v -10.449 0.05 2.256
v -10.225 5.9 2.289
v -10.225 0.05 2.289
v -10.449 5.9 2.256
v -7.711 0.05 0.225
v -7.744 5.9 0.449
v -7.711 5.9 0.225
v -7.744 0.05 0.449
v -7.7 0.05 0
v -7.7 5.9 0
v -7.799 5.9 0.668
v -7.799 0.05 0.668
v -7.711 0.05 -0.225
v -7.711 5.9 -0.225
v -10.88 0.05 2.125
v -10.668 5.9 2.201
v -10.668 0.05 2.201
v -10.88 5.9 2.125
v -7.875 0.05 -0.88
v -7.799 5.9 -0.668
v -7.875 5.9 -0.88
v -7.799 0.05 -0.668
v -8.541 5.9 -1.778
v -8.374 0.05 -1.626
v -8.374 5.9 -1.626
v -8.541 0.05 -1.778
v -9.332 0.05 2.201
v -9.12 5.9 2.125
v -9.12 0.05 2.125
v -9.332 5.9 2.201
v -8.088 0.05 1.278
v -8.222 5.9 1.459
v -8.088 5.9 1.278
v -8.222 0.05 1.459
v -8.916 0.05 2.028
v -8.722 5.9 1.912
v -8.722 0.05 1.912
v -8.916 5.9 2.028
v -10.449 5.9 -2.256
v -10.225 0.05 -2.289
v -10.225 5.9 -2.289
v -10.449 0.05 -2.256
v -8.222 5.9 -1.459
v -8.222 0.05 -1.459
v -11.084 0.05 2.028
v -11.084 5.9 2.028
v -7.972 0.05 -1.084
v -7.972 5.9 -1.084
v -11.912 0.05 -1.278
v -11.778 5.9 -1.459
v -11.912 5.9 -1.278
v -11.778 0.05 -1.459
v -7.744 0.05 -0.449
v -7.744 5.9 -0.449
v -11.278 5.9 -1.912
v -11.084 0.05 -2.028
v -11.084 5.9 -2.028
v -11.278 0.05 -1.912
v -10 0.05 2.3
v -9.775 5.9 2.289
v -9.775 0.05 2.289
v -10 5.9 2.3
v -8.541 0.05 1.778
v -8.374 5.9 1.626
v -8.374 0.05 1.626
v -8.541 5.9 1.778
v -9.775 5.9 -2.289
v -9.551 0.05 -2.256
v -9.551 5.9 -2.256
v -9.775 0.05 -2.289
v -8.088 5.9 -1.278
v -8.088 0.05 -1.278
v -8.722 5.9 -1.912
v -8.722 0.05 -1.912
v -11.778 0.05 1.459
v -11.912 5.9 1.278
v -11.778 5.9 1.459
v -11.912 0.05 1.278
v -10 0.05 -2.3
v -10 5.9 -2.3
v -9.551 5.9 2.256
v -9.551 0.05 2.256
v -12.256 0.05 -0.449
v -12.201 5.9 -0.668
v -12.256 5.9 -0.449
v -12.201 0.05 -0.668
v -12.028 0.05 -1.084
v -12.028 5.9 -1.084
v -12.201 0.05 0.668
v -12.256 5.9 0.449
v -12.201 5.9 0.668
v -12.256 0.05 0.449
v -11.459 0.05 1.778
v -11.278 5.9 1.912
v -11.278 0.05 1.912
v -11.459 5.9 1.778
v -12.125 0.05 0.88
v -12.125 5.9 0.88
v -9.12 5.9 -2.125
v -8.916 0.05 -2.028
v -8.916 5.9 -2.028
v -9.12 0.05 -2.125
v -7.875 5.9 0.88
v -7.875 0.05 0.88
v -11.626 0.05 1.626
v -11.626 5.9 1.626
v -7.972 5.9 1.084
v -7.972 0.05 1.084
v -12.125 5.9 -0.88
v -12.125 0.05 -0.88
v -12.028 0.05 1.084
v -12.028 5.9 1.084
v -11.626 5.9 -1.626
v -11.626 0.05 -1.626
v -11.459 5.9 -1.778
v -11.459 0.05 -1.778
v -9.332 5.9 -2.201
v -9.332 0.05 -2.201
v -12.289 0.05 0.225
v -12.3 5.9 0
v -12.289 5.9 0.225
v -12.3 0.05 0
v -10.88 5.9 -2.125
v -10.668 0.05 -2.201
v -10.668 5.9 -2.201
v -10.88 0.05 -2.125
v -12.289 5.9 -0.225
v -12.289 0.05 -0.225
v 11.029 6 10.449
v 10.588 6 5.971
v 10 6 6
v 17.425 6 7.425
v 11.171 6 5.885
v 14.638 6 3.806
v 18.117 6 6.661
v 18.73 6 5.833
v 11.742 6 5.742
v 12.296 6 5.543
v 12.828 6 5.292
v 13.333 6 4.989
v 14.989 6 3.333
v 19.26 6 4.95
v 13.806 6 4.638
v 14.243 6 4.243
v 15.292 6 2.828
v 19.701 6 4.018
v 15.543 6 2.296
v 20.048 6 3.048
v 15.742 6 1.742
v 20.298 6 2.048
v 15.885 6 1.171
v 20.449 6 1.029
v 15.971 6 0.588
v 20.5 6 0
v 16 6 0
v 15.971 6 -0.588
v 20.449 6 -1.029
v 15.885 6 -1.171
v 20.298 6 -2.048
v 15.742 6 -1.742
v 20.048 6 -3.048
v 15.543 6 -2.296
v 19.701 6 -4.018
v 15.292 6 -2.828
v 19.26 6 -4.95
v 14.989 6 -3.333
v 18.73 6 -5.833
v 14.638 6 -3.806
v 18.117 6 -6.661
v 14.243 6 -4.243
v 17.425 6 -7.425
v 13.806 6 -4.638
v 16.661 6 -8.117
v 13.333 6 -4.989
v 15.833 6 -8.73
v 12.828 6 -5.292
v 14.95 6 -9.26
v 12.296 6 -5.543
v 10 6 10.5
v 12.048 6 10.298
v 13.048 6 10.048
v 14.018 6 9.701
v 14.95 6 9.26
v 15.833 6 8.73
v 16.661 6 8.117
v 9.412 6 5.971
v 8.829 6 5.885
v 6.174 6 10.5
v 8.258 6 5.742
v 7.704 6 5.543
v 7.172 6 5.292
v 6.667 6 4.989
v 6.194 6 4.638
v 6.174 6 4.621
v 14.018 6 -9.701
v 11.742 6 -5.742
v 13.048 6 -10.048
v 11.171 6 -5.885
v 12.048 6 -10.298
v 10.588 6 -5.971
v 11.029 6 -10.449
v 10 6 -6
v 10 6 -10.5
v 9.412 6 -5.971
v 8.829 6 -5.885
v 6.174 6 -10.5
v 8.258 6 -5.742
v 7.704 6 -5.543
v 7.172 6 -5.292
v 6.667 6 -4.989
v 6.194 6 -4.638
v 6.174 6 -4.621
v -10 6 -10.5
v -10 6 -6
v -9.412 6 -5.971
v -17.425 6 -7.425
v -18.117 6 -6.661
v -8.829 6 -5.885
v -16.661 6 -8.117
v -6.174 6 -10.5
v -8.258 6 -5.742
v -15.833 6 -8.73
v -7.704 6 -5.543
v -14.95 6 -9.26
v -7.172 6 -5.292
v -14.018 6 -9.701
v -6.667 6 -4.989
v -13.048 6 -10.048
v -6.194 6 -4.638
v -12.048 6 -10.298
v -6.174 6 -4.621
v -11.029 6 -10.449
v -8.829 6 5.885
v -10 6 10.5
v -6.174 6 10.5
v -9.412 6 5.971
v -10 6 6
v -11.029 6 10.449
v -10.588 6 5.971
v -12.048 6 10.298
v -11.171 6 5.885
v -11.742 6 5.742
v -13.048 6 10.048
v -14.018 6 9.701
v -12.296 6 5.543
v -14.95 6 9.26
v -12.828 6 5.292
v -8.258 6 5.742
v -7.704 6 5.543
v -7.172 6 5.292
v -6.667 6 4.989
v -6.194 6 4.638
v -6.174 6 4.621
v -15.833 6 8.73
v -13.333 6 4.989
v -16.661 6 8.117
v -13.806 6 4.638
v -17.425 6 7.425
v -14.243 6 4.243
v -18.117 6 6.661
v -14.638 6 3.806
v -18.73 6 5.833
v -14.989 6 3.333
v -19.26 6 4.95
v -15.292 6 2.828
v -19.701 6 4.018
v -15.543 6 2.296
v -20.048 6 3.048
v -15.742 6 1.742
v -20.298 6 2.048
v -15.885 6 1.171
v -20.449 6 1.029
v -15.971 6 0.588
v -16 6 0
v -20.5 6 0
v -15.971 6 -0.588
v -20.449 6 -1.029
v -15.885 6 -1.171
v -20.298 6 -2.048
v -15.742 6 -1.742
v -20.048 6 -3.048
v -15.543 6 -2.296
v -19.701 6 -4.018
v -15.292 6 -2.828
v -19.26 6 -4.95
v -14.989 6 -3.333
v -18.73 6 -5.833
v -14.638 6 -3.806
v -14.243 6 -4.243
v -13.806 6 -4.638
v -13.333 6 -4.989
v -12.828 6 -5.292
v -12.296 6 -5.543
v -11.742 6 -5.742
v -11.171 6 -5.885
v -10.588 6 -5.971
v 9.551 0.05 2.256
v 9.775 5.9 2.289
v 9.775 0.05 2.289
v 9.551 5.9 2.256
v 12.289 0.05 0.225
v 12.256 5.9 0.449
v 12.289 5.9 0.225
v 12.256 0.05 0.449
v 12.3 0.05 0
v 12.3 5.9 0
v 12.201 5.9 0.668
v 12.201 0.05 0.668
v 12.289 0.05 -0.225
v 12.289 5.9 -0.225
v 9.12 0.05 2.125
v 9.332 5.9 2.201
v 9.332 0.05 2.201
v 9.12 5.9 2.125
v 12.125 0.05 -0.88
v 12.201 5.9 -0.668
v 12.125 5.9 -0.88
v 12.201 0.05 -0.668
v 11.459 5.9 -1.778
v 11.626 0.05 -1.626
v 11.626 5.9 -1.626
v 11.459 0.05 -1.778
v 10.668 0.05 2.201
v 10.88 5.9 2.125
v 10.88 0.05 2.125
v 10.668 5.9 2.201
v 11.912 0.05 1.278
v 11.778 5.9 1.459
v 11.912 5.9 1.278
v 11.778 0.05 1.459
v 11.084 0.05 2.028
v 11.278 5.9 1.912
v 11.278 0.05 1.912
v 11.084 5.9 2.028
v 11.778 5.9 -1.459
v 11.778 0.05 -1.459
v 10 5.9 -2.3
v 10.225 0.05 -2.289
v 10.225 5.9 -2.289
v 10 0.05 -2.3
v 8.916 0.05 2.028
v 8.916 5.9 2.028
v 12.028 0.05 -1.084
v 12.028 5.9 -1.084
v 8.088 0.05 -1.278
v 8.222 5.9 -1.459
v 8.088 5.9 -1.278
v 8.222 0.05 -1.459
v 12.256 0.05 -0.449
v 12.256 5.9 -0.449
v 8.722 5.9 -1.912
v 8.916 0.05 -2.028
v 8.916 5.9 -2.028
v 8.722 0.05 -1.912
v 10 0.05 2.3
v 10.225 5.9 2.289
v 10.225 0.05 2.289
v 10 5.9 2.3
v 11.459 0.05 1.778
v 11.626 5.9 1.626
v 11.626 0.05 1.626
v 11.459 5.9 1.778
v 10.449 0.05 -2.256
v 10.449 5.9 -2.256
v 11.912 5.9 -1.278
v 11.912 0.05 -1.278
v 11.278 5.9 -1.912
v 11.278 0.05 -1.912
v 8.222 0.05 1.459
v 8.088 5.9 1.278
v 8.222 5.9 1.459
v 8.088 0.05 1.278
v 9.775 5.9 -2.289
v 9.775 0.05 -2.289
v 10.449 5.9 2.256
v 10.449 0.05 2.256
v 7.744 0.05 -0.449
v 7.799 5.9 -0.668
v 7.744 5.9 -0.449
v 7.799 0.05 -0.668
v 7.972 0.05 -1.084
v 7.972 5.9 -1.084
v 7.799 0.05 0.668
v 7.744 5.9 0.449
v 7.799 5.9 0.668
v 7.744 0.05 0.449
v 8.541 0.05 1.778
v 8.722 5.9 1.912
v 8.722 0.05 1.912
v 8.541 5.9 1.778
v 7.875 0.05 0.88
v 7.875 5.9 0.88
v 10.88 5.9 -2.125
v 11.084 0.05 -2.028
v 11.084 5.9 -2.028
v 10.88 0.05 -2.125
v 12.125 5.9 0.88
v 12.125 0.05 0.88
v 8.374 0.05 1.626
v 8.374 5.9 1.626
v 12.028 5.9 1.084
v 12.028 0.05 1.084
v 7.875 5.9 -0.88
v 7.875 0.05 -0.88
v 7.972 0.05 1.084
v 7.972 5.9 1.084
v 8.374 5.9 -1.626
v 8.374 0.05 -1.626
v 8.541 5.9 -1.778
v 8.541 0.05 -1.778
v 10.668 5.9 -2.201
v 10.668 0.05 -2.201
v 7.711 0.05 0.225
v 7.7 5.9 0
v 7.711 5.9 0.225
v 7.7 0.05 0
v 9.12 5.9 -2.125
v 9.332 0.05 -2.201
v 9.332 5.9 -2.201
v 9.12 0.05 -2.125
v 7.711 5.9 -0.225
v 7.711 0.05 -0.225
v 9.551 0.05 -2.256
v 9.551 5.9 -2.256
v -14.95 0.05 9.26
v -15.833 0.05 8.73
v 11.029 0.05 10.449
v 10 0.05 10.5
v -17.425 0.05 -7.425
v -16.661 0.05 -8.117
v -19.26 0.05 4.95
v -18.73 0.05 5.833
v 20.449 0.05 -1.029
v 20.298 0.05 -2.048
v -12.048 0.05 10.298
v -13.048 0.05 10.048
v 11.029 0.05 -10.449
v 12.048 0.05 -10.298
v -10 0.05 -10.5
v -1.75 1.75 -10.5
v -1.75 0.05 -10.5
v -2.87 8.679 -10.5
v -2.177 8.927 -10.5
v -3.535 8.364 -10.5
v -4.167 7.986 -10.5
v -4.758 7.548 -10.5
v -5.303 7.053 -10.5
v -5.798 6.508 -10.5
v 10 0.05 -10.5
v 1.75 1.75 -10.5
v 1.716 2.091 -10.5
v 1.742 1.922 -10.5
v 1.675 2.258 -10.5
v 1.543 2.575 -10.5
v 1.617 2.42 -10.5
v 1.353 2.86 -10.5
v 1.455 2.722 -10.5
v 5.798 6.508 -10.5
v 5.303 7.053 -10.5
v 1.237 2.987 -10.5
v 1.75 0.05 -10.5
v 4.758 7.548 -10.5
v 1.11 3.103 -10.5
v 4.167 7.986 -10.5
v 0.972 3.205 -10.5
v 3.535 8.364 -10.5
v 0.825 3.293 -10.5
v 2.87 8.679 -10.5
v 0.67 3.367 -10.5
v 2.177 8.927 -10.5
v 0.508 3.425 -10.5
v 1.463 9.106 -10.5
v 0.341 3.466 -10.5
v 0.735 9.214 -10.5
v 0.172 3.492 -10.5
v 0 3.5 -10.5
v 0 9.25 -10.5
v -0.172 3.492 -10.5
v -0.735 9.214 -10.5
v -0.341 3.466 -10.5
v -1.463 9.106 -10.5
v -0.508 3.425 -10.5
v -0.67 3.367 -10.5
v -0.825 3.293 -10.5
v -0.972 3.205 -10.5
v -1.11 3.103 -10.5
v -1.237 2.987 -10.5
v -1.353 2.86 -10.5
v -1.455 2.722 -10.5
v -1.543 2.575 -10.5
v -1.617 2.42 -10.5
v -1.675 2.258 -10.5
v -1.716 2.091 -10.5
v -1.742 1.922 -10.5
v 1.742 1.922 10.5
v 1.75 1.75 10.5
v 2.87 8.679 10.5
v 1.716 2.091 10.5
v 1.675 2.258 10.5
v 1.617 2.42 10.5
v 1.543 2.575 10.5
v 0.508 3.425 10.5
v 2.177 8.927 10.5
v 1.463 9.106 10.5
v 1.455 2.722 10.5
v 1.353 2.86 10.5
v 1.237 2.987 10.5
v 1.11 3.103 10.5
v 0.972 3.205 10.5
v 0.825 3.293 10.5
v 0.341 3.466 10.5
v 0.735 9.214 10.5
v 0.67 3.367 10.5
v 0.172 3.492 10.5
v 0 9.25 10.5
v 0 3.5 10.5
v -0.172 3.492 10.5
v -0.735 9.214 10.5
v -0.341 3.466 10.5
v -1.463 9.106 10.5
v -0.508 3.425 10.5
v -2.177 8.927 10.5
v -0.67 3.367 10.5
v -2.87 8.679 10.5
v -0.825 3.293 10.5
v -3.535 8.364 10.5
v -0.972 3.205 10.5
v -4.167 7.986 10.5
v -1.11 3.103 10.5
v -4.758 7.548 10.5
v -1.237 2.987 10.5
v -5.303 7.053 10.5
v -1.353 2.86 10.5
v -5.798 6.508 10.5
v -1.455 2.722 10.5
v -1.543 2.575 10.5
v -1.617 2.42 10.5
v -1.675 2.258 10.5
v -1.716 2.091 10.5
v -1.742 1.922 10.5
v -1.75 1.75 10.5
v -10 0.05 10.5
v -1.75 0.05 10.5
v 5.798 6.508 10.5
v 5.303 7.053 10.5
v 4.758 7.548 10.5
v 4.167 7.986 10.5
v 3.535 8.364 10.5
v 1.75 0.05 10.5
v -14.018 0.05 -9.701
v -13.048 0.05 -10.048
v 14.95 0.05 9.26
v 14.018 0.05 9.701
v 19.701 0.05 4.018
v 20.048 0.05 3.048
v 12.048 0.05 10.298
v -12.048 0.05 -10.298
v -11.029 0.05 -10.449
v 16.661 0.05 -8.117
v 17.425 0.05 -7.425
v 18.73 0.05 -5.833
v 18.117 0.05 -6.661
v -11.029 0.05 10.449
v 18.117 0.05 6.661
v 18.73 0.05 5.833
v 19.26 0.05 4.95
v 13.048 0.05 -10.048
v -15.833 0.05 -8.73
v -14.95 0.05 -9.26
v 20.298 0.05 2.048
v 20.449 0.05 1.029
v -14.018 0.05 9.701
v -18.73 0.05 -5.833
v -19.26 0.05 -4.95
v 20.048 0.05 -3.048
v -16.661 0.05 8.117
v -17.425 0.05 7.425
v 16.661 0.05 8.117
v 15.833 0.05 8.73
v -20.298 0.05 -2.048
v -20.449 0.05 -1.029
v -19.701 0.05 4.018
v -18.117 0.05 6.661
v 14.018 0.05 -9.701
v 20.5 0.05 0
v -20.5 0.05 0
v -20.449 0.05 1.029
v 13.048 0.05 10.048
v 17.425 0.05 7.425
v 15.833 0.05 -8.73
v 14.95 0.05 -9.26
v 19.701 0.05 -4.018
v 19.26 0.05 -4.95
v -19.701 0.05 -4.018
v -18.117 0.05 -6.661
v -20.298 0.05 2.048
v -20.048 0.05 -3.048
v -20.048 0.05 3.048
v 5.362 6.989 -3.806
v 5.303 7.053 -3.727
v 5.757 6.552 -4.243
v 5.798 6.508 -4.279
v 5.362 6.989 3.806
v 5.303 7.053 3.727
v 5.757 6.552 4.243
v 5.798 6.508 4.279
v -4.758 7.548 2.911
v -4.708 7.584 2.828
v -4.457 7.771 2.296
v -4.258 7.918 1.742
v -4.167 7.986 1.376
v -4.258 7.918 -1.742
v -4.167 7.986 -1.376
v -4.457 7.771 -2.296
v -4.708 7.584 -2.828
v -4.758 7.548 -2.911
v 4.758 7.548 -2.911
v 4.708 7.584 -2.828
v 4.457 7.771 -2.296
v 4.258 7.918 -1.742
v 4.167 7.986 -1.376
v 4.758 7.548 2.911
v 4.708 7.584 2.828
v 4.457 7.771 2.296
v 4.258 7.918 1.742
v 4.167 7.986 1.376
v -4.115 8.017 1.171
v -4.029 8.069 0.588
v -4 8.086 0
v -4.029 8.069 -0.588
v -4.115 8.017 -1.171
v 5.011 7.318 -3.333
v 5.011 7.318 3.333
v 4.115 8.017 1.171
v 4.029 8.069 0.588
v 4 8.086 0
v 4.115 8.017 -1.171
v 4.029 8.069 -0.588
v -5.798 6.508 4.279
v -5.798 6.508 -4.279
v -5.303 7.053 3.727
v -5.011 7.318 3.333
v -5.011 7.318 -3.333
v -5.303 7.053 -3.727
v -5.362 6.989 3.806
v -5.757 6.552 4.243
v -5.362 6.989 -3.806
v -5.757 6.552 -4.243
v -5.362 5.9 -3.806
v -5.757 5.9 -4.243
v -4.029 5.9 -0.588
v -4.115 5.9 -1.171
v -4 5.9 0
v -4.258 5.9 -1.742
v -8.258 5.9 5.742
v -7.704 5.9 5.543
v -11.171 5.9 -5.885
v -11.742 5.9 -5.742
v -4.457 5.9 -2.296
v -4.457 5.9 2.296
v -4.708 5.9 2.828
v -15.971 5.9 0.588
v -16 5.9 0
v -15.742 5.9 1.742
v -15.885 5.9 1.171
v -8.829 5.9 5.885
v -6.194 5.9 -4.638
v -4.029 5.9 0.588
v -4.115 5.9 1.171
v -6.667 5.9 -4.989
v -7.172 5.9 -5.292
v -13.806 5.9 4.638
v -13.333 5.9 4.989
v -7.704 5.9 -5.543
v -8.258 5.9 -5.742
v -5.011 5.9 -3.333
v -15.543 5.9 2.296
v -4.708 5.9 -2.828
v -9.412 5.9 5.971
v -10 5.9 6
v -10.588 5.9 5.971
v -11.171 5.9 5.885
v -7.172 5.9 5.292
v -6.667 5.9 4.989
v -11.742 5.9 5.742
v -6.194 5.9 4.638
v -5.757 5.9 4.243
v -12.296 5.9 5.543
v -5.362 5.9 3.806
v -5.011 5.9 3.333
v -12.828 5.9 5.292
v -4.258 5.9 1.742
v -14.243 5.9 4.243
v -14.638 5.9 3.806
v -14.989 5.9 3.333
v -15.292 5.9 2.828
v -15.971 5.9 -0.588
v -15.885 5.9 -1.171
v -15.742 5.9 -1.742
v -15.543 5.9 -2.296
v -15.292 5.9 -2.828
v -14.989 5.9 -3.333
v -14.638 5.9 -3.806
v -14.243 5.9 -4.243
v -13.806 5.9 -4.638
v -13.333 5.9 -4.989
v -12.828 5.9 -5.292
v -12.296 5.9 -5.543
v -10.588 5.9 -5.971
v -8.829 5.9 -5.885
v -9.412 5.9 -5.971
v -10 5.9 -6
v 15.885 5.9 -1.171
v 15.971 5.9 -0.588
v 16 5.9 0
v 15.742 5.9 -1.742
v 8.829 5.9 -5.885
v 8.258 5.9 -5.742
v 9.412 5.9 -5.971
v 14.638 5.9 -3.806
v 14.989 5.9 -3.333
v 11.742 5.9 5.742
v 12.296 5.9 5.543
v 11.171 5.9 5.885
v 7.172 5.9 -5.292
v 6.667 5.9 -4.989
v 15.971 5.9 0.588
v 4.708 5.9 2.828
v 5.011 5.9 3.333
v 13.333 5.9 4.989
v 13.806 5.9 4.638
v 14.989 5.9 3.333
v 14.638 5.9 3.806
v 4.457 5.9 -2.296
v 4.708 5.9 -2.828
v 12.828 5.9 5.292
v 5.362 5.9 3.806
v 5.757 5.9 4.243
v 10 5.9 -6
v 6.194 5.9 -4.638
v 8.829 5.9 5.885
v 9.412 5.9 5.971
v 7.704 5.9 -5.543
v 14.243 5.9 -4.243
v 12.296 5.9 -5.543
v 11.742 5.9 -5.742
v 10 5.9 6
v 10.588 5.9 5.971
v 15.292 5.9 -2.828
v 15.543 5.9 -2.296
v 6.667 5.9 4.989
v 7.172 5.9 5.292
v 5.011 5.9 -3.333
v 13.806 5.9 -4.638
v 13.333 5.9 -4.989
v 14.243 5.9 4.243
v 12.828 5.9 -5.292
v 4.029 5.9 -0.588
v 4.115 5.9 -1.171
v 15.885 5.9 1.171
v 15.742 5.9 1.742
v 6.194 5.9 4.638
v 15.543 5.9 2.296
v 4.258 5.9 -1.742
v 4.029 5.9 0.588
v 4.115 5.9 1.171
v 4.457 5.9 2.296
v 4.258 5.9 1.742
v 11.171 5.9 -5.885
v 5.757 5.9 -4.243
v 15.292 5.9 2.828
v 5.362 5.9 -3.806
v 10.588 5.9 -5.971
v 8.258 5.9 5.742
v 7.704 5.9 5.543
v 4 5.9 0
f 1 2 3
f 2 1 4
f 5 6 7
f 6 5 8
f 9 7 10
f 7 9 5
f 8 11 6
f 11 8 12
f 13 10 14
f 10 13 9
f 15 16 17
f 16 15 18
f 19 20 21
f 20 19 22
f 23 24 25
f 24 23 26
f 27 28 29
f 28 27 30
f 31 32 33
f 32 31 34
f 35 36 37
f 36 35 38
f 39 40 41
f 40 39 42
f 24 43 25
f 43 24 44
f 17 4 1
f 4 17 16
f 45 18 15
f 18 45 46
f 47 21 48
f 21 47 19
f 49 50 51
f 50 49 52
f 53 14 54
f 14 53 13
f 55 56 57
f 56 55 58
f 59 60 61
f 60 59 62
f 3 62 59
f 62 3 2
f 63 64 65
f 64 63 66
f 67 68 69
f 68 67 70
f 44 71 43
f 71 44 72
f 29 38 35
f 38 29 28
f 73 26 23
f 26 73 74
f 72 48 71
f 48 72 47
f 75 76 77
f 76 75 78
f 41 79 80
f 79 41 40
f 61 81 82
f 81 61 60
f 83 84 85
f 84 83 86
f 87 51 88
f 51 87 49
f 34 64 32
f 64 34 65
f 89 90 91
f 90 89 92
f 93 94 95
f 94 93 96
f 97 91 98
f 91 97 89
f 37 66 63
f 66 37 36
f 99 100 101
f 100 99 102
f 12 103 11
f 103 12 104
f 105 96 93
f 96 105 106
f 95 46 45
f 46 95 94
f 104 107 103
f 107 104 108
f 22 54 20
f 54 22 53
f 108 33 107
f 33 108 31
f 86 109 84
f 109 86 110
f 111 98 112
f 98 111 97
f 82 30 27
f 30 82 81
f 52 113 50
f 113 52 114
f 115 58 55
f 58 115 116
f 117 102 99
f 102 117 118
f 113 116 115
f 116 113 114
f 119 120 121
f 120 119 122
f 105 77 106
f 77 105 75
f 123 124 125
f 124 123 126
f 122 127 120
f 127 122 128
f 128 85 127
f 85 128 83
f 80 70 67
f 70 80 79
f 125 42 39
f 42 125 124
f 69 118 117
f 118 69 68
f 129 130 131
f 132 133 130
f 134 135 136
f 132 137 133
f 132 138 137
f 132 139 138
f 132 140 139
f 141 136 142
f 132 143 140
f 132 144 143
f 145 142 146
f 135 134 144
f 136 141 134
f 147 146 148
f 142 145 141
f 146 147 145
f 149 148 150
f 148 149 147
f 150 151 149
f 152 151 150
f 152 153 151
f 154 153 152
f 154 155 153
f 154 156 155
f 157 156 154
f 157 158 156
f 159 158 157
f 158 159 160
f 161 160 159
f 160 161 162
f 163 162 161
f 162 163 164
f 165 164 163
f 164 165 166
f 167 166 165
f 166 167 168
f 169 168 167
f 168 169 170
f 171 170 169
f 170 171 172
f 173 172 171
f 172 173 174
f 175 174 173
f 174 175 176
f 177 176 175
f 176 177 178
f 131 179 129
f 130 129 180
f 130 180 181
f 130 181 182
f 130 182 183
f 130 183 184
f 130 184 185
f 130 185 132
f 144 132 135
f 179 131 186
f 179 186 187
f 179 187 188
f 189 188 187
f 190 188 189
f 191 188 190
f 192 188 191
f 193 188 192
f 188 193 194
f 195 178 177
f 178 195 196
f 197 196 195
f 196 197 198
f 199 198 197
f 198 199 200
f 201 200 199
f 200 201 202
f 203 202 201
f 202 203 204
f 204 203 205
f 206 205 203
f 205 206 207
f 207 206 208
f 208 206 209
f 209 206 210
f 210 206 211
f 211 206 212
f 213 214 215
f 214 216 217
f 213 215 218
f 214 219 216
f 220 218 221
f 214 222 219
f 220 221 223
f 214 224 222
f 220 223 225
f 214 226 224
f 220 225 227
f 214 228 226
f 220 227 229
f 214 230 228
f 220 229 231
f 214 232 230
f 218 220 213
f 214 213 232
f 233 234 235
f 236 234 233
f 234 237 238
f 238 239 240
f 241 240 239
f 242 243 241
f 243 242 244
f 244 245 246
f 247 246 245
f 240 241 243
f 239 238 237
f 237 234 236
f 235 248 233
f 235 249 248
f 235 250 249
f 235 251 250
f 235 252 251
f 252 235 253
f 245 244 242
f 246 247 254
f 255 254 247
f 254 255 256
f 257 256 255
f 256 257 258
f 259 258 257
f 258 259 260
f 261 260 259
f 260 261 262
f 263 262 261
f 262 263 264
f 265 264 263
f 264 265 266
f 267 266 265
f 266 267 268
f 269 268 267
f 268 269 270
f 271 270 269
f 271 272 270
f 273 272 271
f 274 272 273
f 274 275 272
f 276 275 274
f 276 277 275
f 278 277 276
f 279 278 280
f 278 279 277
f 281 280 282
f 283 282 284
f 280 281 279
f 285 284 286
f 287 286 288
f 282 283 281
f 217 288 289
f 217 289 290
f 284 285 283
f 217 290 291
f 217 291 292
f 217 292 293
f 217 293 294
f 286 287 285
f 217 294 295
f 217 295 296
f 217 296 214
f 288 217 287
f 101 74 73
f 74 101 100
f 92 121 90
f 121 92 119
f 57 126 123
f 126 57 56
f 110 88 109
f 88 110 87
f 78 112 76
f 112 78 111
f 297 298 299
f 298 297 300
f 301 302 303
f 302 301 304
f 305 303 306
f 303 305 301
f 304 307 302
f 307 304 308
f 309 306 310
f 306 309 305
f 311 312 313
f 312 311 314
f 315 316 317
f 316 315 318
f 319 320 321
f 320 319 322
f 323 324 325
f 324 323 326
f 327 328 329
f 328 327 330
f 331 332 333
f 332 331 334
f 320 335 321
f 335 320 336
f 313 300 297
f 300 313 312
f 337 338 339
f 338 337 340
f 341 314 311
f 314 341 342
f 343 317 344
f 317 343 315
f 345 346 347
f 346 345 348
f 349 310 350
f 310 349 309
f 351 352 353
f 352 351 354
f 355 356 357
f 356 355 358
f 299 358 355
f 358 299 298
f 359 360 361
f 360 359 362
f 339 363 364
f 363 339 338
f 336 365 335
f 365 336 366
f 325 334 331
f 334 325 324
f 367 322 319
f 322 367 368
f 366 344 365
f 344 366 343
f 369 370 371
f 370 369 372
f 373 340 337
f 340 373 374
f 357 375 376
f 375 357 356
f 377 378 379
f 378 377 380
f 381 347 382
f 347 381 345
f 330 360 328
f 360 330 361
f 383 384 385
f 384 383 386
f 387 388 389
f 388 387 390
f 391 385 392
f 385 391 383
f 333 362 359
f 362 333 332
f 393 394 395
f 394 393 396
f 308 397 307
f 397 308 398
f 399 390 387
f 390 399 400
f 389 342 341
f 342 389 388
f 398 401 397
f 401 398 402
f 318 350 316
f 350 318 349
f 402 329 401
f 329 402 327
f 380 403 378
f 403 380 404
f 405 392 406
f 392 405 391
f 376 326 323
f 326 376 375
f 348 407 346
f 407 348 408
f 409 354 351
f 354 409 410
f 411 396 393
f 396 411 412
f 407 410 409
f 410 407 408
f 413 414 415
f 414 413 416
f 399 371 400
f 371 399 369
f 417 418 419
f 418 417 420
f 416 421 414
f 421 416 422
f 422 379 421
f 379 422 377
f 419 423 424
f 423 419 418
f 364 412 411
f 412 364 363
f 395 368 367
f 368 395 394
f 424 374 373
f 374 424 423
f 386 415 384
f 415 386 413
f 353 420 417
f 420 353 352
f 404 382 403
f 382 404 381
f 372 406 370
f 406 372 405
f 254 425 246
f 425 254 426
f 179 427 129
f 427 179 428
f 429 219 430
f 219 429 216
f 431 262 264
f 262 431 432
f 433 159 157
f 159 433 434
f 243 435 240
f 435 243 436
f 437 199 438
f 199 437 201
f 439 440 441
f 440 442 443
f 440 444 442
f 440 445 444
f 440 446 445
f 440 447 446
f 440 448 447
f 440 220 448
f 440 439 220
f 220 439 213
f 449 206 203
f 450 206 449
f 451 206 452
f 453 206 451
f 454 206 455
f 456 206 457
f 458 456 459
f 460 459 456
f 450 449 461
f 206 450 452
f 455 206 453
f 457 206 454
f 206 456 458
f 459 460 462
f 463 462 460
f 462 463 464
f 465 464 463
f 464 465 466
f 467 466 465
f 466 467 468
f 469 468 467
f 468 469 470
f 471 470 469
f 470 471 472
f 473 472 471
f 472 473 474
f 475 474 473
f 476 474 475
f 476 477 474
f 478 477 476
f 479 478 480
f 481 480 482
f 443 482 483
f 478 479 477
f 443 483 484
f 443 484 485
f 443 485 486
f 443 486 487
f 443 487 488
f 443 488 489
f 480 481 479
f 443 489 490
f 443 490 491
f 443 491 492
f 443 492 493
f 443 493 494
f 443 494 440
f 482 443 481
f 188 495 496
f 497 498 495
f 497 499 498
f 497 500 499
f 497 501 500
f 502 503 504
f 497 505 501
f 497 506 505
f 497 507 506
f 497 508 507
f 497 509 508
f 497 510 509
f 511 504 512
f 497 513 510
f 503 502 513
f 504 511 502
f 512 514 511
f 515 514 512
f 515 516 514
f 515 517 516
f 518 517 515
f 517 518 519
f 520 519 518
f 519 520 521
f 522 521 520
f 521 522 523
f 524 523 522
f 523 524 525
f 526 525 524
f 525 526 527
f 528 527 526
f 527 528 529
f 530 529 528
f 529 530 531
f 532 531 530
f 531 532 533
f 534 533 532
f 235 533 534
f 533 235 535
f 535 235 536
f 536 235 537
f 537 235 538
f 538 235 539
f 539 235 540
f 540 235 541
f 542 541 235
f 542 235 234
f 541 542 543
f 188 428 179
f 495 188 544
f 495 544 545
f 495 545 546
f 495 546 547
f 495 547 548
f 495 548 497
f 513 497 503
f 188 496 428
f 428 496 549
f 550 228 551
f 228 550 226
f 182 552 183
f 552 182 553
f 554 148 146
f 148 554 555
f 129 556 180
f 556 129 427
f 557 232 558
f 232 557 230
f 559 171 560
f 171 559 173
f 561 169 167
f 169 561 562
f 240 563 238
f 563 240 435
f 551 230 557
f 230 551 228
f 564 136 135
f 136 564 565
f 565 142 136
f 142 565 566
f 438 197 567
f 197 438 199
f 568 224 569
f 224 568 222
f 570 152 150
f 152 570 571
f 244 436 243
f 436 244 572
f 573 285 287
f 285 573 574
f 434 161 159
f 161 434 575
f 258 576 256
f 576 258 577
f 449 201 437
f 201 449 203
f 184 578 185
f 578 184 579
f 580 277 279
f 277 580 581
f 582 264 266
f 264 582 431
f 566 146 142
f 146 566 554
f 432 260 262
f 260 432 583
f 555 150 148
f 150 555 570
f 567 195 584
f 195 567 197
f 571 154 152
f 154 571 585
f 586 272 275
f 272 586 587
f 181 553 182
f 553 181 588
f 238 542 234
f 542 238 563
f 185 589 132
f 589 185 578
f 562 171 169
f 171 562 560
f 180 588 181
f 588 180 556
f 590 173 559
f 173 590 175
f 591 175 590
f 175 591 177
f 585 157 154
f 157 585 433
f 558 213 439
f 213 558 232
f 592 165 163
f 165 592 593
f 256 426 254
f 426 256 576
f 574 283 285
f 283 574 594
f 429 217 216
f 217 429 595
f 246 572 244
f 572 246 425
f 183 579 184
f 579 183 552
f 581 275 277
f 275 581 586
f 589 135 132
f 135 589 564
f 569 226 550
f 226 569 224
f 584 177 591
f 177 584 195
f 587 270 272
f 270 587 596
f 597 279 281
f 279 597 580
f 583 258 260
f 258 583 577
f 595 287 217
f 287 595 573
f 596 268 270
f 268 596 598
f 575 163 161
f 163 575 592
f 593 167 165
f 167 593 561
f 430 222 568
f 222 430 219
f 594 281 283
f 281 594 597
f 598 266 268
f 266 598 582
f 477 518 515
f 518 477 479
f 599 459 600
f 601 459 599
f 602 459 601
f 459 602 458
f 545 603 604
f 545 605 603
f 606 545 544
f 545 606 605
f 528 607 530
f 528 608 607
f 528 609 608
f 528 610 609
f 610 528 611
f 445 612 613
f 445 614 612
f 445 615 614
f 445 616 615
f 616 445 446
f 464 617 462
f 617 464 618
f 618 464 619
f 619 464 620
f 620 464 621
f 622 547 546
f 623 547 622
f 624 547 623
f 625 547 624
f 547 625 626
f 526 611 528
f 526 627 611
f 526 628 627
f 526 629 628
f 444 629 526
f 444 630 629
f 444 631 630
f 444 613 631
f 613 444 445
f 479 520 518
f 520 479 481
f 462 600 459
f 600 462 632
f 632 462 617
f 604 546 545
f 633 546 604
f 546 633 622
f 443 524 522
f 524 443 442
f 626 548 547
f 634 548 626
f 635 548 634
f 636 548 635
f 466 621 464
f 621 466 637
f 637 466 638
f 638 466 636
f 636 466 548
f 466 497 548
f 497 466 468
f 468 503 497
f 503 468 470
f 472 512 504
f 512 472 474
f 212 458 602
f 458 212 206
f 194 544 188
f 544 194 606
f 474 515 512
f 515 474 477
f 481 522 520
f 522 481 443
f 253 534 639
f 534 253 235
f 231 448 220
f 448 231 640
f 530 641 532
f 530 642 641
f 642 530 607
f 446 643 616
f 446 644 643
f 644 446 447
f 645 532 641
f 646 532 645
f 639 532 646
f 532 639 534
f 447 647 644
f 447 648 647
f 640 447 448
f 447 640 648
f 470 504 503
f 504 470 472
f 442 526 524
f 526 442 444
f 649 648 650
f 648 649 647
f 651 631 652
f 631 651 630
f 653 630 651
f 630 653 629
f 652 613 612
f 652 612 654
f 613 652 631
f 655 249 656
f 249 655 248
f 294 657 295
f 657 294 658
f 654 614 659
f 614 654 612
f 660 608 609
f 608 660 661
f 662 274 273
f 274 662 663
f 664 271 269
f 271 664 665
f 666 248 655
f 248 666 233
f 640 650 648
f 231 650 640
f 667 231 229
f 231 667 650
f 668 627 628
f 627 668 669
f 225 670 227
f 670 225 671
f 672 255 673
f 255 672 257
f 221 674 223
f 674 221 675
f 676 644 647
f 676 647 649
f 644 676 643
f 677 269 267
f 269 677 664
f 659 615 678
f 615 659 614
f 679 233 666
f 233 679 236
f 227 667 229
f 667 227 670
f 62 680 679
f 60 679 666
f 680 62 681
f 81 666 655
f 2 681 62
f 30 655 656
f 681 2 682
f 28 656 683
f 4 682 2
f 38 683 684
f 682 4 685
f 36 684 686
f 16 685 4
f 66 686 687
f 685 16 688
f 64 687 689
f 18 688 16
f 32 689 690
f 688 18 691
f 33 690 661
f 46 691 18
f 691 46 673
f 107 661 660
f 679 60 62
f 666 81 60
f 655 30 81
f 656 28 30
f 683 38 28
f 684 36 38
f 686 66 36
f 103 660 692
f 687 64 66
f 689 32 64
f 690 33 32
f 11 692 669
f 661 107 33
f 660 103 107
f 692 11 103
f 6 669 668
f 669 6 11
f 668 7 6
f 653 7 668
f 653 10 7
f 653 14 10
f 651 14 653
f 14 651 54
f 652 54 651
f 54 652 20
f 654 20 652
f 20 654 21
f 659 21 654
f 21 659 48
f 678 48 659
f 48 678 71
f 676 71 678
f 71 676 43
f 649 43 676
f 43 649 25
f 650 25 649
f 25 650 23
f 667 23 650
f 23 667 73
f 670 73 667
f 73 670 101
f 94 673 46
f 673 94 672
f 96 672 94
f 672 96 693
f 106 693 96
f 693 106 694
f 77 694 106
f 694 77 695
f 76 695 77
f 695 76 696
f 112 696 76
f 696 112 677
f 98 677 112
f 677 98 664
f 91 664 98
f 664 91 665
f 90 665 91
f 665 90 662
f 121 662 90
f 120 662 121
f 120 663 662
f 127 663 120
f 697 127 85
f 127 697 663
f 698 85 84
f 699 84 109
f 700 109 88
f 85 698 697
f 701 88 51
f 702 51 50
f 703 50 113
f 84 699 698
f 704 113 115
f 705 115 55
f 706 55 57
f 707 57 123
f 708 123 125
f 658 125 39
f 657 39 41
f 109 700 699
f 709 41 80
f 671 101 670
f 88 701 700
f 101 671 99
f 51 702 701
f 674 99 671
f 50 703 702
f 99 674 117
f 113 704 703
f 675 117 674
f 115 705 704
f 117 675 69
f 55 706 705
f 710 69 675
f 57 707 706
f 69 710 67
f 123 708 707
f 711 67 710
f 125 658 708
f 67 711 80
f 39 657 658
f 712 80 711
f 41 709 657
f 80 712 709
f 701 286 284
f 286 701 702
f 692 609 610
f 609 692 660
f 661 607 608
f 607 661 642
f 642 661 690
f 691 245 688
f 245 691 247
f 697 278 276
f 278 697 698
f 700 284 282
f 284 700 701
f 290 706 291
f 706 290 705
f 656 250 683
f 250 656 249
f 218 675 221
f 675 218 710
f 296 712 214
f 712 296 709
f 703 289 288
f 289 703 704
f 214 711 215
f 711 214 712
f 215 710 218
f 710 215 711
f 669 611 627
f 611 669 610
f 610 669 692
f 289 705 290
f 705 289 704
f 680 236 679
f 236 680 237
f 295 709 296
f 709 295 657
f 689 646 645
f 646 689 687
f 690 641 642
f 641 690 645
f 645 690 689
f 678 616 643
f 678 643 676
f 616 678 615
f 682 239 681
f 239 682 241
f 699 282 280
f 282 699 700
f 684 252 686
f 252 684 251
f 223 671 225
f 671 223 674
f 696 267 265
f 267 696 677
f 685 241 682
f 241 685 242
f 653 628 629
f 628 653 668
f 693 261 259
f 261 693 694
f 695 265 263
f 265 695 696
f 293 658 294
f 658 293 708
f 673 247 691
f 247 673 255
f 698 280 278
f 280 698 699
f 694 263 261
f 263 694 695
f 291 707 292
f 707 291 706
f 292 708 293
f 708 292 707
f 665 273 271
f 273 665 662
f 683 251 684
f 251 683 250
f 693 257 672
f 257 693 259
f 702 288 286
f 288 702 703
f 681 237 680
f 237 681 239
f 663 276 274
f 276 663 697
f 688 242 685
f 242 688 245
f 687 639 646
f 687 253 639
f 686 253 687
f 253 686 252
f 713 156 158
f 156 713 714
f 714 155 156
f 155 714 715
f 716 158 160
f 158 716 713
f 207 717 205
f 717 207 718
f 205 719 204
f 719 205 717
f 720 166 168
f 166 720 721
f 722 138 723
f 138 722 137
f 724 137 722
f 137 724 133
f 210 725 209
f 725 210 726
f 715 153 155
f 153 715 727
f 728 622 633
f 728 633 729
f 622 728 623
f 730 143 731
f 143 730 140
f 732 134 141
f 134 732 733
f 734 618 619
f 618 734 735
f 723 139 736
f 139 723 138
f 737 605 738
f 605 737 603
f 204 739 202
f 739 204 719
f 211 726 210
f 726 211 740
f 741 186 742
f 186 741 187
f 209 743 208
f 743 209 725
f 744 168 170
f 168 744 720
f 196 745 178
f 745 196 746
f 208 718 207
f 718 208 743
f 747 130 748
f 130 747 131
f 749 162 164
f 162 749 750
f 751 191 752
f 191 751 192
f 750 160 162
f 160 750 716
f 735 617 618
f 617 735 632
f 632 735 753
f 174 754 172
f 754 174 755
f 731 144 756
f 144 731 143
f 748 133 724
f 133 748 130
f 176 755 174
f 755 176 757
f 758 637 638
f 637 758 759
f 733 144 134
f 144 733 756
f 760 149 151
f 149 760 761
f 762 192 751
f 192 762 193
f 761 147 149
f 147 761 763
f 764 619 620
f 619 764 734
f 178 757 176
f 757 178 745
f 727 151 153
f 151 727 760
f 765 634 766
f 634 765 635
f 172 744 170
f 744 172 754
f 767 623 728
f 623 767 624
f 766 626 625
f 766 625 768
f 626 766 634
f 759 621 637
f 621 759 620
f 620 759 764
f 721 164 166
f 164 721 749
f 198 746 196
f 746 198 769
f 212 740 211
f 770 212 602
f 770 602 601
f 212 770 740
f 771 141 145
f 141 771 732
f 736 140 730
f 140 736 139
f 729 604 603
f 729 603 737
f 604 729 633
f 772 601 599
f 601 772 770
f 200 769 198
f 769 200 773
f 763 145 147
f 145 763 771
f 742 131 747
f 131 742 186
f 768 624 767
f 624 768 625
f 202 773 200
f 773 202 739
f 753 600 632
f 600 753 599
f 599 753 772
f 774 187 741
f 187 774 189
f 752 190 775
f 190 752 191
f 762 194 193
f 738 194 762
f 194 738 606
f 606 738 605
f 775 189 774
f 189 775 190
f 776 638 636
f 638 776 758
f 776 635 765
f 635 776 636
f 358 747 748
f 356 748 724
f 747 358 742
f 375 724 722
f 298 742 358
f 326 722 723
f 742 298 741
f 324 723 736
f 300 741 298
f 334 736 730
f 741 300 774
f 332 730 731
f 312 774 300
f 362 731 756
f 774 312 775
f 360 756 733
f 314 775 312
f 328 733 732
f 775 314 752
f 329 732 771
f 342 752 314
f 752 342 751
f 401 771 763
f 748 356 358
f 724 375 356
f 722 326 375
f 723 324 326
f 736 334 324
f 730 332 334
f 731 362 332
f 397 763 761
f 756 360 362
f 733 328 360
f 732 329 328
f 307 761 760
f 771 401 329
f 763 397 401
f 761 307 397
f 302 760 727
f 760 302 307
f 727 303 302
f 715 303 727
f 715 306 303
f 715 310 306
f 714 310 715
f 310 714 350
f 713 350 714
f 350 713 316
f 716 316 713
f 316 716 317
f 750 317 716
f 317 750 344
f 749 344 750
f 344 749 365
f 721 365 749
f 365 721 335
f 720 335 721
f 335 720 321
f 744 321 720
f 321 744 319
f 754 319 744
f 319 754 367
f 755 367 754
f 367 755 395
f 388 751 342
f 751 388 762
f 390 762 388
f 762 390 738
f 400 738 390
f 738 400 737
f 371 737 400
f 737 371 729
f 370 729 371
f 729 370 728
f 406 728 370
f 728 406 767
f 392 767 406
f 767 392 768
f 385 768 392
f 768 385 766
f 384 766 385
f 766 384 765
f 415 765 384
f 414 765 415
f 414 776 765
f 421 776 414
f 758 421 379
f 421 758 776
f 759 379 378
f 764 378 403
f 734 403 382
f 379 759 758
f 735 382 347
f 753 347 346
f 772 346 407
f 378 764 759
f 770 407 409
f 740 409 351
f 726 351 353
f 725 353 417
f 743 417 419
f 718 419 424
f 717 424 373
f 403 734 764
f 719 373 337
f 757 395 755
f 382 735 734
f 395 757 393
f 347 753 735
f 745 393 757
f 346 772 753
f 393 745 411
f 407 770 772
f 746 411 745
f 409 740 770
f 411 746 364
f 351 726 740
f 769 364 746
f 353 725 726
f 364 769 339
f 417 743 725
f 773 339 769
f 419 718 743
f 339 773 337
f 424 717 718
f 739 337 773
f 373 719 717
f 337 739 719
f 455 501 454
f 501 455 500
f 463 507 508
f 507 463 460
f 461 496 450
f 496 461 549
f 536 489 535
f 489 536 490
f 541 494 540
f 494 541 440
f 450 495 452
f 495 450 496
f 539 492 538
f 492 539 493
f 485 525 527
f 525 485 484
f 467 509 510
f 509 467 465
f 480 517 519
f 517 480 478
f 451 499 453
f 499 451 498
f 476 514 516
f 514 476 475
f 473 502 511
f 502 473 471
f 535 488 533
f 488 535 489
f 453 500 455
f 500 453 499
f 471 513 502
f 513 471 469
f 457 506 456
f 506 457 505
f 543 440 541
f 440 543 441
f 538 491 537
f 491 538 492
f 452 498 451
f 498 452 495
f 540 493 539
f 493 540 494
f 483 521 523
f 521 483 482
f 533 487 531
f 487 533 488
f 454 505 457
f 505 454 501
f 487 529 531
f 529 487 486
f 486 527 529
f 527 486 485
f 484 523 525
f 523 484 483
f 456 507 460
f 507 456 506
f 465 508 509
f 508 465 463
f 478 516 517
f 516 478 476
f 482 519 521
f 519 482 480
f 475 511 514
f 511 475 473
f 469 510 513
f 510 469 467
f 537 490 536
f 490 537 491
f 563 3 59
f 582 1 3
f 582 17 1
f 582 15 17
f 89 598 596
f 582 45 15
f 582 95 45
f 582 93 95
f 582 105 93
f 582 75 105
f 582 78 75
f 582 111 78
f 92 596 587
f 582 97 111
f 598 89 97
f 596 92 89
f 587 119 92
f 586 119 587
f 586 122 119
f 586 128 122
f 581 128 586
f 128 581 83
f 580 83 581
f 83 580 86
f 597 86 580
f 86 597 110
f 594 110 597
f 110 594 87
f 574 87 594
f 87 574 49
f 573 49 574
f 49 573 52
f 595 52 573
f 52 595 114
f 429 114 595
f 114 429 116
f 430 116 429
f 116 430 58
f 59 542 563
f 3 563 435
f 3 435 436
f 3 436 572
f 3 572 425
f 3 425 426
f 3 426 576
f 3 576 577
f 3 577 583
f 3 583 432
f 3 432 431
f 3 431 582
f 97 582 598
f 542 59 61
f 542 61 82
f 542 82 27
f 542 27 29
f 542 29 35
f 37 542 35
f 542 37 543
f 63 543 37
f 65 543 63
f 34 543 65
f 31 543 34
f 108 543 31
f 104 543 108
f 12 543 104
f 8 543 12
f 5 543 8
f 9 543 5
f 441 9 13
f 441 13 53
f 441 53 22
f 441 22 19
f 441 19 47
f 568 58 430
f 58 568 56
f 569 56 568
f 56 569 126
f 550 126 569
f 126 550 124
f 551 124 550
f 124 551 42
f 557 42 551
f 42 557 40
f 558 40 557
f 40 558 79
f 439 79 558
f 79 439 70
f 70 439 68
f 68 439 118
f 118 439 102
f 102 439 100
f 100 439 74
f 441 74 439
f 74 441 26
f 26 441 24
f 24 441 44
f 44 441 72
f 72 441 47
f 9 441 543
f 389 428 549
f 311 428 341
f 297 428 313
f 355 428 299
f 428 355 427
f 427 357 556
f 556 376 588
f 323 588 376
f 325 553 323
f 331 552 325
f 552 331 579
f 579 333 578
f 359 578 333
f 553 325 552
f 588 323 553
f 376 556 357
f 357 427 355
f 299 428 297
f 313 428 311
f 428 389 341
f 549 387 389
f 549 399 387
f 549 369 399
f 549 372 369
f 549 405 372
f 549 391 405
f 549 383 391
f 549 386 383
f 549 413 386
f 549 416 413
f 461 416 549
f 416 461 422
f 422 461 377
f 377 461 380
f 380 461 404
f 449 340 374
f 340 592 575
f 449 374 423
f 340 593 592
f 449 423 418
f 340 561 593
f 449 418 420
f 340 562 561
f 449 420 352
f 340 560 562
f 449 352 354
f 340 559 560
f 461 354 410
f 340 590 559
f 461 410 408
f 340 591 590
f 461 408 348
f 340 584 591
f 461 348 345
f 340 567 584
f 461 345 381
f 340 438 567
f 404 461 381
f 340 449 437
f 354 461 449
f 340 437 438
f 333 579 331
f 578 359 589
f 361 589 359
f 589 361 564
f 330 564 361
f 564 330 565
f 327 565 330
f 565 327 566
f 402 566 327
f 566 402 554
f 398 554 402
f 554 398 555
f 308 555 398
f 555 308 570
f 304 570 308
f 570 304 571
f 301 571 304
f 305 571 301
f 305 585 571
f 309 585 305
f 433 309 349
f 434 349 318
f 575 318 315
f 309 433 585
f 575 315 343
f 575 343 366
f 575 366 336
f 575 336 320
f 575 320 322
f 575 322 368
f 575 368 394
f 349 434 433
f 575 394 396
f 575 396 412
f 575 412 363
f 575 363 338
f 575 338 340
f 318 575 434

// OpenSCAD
/*
*   D Ring mounting bracket.
*   CudaTox, http://cudatox.ca/l/
*   @cudatox
*
*   Feb 17, 2017
*
*   A simple, procedural mounting bracket that can be used to affix a D Ring to many
*   different surfaces. 
*
*   This software and 3D model(s) are experimental and are provided for educational 
*   purposes only. 
*
*   Use of this software, any of its derivatives, or use of any of the models or 
*   parts provided with or created using this software is done at your own risk. 
*
*   DO NOT use this part for securing loads. DO NOT use this part in applications 
*   that may result in property damage, injury or death. NOT FOR CLIMBING USE.
*
*/


OD = 15;                        //Diameter of the outer cylindrical part of the bracket.
                                //This should be larger than ID

ID = 3.5;                       //Inner diameter of the bracket

length = 21;                    //width of the bracket, this should be smaller 
                                //than the width of the D ring.
                                
thickness = 6;                  //Thickness of the flat parts of the bracket

drill_centers = 20;             //Distance between the mounting holes

drill_dia = 4.6;                //Diameter of the mounting holes

head_dia = 12;                  //Cutaway for the head of the screw or washer. Zero to disable.

head_inset = 0.1;               //Inset distance for the head of the screw, 
                                //if head cutaway enabled.

$fn = 64;                       //Resolution

difference(){
    
    union(){
        hull(){
            translate([0,ID/2,0])
                cylinder(length, OD/2, OD/2,  true);
            translate([0,-ID/2,0])
                cylinder(length, OD/2, OD/2,  true);
        }
        rotate([90,0,0])
            difference(){

                hull(){
                    translate([-drill_centers/2,0,0])
                        cylinder(thickness * 2, length/2, length/2, true);
                    translate([drill_centers/2,0,0])
                        cylinder(thickness * 2, length/2, length/2, true);
                }
                
                union(){
                    translate([-drill_centers/2,0,0])
                        cylinder(thickness * 2, drill_dia/2, drill_dia/2, true);
                    translate([drill_centers/2,0,0])
                        cylinder(thickness * 2, drill_dia/2, drill_dia/2, true);
                }
            }
    }
    
    union(){
        //Cuts with a small factor added to avoid manifold issues.
        hull(){
        translate([0,ID/2,0])
            cylinder(length + 0.1, ID/2, ID/2, true);
        translate([0,-ID/2,0])
            cylinder(length + 0.1, ID/2, ID/2, true);
        }
        
        rotate([-90,0,0]) translate([0,0,thickness-head_inset])
        if (head_dia > 0){
            translate([-drill_centers/2,0,0])
                cylinder(thickness * 2, head_dia/2, head_dia/2, false);
            translate([drill_centers/2,0,0])
                cylinder(thickness * 2, head_dia/2, head_dia/2, false);
        }
        
        translate([0,-max(OD, thickness)/2,0])
            cube([drill_centers + 2 * length, max(OD, thickness) + 0.1, length + 0.1], true);
    }
    
}
